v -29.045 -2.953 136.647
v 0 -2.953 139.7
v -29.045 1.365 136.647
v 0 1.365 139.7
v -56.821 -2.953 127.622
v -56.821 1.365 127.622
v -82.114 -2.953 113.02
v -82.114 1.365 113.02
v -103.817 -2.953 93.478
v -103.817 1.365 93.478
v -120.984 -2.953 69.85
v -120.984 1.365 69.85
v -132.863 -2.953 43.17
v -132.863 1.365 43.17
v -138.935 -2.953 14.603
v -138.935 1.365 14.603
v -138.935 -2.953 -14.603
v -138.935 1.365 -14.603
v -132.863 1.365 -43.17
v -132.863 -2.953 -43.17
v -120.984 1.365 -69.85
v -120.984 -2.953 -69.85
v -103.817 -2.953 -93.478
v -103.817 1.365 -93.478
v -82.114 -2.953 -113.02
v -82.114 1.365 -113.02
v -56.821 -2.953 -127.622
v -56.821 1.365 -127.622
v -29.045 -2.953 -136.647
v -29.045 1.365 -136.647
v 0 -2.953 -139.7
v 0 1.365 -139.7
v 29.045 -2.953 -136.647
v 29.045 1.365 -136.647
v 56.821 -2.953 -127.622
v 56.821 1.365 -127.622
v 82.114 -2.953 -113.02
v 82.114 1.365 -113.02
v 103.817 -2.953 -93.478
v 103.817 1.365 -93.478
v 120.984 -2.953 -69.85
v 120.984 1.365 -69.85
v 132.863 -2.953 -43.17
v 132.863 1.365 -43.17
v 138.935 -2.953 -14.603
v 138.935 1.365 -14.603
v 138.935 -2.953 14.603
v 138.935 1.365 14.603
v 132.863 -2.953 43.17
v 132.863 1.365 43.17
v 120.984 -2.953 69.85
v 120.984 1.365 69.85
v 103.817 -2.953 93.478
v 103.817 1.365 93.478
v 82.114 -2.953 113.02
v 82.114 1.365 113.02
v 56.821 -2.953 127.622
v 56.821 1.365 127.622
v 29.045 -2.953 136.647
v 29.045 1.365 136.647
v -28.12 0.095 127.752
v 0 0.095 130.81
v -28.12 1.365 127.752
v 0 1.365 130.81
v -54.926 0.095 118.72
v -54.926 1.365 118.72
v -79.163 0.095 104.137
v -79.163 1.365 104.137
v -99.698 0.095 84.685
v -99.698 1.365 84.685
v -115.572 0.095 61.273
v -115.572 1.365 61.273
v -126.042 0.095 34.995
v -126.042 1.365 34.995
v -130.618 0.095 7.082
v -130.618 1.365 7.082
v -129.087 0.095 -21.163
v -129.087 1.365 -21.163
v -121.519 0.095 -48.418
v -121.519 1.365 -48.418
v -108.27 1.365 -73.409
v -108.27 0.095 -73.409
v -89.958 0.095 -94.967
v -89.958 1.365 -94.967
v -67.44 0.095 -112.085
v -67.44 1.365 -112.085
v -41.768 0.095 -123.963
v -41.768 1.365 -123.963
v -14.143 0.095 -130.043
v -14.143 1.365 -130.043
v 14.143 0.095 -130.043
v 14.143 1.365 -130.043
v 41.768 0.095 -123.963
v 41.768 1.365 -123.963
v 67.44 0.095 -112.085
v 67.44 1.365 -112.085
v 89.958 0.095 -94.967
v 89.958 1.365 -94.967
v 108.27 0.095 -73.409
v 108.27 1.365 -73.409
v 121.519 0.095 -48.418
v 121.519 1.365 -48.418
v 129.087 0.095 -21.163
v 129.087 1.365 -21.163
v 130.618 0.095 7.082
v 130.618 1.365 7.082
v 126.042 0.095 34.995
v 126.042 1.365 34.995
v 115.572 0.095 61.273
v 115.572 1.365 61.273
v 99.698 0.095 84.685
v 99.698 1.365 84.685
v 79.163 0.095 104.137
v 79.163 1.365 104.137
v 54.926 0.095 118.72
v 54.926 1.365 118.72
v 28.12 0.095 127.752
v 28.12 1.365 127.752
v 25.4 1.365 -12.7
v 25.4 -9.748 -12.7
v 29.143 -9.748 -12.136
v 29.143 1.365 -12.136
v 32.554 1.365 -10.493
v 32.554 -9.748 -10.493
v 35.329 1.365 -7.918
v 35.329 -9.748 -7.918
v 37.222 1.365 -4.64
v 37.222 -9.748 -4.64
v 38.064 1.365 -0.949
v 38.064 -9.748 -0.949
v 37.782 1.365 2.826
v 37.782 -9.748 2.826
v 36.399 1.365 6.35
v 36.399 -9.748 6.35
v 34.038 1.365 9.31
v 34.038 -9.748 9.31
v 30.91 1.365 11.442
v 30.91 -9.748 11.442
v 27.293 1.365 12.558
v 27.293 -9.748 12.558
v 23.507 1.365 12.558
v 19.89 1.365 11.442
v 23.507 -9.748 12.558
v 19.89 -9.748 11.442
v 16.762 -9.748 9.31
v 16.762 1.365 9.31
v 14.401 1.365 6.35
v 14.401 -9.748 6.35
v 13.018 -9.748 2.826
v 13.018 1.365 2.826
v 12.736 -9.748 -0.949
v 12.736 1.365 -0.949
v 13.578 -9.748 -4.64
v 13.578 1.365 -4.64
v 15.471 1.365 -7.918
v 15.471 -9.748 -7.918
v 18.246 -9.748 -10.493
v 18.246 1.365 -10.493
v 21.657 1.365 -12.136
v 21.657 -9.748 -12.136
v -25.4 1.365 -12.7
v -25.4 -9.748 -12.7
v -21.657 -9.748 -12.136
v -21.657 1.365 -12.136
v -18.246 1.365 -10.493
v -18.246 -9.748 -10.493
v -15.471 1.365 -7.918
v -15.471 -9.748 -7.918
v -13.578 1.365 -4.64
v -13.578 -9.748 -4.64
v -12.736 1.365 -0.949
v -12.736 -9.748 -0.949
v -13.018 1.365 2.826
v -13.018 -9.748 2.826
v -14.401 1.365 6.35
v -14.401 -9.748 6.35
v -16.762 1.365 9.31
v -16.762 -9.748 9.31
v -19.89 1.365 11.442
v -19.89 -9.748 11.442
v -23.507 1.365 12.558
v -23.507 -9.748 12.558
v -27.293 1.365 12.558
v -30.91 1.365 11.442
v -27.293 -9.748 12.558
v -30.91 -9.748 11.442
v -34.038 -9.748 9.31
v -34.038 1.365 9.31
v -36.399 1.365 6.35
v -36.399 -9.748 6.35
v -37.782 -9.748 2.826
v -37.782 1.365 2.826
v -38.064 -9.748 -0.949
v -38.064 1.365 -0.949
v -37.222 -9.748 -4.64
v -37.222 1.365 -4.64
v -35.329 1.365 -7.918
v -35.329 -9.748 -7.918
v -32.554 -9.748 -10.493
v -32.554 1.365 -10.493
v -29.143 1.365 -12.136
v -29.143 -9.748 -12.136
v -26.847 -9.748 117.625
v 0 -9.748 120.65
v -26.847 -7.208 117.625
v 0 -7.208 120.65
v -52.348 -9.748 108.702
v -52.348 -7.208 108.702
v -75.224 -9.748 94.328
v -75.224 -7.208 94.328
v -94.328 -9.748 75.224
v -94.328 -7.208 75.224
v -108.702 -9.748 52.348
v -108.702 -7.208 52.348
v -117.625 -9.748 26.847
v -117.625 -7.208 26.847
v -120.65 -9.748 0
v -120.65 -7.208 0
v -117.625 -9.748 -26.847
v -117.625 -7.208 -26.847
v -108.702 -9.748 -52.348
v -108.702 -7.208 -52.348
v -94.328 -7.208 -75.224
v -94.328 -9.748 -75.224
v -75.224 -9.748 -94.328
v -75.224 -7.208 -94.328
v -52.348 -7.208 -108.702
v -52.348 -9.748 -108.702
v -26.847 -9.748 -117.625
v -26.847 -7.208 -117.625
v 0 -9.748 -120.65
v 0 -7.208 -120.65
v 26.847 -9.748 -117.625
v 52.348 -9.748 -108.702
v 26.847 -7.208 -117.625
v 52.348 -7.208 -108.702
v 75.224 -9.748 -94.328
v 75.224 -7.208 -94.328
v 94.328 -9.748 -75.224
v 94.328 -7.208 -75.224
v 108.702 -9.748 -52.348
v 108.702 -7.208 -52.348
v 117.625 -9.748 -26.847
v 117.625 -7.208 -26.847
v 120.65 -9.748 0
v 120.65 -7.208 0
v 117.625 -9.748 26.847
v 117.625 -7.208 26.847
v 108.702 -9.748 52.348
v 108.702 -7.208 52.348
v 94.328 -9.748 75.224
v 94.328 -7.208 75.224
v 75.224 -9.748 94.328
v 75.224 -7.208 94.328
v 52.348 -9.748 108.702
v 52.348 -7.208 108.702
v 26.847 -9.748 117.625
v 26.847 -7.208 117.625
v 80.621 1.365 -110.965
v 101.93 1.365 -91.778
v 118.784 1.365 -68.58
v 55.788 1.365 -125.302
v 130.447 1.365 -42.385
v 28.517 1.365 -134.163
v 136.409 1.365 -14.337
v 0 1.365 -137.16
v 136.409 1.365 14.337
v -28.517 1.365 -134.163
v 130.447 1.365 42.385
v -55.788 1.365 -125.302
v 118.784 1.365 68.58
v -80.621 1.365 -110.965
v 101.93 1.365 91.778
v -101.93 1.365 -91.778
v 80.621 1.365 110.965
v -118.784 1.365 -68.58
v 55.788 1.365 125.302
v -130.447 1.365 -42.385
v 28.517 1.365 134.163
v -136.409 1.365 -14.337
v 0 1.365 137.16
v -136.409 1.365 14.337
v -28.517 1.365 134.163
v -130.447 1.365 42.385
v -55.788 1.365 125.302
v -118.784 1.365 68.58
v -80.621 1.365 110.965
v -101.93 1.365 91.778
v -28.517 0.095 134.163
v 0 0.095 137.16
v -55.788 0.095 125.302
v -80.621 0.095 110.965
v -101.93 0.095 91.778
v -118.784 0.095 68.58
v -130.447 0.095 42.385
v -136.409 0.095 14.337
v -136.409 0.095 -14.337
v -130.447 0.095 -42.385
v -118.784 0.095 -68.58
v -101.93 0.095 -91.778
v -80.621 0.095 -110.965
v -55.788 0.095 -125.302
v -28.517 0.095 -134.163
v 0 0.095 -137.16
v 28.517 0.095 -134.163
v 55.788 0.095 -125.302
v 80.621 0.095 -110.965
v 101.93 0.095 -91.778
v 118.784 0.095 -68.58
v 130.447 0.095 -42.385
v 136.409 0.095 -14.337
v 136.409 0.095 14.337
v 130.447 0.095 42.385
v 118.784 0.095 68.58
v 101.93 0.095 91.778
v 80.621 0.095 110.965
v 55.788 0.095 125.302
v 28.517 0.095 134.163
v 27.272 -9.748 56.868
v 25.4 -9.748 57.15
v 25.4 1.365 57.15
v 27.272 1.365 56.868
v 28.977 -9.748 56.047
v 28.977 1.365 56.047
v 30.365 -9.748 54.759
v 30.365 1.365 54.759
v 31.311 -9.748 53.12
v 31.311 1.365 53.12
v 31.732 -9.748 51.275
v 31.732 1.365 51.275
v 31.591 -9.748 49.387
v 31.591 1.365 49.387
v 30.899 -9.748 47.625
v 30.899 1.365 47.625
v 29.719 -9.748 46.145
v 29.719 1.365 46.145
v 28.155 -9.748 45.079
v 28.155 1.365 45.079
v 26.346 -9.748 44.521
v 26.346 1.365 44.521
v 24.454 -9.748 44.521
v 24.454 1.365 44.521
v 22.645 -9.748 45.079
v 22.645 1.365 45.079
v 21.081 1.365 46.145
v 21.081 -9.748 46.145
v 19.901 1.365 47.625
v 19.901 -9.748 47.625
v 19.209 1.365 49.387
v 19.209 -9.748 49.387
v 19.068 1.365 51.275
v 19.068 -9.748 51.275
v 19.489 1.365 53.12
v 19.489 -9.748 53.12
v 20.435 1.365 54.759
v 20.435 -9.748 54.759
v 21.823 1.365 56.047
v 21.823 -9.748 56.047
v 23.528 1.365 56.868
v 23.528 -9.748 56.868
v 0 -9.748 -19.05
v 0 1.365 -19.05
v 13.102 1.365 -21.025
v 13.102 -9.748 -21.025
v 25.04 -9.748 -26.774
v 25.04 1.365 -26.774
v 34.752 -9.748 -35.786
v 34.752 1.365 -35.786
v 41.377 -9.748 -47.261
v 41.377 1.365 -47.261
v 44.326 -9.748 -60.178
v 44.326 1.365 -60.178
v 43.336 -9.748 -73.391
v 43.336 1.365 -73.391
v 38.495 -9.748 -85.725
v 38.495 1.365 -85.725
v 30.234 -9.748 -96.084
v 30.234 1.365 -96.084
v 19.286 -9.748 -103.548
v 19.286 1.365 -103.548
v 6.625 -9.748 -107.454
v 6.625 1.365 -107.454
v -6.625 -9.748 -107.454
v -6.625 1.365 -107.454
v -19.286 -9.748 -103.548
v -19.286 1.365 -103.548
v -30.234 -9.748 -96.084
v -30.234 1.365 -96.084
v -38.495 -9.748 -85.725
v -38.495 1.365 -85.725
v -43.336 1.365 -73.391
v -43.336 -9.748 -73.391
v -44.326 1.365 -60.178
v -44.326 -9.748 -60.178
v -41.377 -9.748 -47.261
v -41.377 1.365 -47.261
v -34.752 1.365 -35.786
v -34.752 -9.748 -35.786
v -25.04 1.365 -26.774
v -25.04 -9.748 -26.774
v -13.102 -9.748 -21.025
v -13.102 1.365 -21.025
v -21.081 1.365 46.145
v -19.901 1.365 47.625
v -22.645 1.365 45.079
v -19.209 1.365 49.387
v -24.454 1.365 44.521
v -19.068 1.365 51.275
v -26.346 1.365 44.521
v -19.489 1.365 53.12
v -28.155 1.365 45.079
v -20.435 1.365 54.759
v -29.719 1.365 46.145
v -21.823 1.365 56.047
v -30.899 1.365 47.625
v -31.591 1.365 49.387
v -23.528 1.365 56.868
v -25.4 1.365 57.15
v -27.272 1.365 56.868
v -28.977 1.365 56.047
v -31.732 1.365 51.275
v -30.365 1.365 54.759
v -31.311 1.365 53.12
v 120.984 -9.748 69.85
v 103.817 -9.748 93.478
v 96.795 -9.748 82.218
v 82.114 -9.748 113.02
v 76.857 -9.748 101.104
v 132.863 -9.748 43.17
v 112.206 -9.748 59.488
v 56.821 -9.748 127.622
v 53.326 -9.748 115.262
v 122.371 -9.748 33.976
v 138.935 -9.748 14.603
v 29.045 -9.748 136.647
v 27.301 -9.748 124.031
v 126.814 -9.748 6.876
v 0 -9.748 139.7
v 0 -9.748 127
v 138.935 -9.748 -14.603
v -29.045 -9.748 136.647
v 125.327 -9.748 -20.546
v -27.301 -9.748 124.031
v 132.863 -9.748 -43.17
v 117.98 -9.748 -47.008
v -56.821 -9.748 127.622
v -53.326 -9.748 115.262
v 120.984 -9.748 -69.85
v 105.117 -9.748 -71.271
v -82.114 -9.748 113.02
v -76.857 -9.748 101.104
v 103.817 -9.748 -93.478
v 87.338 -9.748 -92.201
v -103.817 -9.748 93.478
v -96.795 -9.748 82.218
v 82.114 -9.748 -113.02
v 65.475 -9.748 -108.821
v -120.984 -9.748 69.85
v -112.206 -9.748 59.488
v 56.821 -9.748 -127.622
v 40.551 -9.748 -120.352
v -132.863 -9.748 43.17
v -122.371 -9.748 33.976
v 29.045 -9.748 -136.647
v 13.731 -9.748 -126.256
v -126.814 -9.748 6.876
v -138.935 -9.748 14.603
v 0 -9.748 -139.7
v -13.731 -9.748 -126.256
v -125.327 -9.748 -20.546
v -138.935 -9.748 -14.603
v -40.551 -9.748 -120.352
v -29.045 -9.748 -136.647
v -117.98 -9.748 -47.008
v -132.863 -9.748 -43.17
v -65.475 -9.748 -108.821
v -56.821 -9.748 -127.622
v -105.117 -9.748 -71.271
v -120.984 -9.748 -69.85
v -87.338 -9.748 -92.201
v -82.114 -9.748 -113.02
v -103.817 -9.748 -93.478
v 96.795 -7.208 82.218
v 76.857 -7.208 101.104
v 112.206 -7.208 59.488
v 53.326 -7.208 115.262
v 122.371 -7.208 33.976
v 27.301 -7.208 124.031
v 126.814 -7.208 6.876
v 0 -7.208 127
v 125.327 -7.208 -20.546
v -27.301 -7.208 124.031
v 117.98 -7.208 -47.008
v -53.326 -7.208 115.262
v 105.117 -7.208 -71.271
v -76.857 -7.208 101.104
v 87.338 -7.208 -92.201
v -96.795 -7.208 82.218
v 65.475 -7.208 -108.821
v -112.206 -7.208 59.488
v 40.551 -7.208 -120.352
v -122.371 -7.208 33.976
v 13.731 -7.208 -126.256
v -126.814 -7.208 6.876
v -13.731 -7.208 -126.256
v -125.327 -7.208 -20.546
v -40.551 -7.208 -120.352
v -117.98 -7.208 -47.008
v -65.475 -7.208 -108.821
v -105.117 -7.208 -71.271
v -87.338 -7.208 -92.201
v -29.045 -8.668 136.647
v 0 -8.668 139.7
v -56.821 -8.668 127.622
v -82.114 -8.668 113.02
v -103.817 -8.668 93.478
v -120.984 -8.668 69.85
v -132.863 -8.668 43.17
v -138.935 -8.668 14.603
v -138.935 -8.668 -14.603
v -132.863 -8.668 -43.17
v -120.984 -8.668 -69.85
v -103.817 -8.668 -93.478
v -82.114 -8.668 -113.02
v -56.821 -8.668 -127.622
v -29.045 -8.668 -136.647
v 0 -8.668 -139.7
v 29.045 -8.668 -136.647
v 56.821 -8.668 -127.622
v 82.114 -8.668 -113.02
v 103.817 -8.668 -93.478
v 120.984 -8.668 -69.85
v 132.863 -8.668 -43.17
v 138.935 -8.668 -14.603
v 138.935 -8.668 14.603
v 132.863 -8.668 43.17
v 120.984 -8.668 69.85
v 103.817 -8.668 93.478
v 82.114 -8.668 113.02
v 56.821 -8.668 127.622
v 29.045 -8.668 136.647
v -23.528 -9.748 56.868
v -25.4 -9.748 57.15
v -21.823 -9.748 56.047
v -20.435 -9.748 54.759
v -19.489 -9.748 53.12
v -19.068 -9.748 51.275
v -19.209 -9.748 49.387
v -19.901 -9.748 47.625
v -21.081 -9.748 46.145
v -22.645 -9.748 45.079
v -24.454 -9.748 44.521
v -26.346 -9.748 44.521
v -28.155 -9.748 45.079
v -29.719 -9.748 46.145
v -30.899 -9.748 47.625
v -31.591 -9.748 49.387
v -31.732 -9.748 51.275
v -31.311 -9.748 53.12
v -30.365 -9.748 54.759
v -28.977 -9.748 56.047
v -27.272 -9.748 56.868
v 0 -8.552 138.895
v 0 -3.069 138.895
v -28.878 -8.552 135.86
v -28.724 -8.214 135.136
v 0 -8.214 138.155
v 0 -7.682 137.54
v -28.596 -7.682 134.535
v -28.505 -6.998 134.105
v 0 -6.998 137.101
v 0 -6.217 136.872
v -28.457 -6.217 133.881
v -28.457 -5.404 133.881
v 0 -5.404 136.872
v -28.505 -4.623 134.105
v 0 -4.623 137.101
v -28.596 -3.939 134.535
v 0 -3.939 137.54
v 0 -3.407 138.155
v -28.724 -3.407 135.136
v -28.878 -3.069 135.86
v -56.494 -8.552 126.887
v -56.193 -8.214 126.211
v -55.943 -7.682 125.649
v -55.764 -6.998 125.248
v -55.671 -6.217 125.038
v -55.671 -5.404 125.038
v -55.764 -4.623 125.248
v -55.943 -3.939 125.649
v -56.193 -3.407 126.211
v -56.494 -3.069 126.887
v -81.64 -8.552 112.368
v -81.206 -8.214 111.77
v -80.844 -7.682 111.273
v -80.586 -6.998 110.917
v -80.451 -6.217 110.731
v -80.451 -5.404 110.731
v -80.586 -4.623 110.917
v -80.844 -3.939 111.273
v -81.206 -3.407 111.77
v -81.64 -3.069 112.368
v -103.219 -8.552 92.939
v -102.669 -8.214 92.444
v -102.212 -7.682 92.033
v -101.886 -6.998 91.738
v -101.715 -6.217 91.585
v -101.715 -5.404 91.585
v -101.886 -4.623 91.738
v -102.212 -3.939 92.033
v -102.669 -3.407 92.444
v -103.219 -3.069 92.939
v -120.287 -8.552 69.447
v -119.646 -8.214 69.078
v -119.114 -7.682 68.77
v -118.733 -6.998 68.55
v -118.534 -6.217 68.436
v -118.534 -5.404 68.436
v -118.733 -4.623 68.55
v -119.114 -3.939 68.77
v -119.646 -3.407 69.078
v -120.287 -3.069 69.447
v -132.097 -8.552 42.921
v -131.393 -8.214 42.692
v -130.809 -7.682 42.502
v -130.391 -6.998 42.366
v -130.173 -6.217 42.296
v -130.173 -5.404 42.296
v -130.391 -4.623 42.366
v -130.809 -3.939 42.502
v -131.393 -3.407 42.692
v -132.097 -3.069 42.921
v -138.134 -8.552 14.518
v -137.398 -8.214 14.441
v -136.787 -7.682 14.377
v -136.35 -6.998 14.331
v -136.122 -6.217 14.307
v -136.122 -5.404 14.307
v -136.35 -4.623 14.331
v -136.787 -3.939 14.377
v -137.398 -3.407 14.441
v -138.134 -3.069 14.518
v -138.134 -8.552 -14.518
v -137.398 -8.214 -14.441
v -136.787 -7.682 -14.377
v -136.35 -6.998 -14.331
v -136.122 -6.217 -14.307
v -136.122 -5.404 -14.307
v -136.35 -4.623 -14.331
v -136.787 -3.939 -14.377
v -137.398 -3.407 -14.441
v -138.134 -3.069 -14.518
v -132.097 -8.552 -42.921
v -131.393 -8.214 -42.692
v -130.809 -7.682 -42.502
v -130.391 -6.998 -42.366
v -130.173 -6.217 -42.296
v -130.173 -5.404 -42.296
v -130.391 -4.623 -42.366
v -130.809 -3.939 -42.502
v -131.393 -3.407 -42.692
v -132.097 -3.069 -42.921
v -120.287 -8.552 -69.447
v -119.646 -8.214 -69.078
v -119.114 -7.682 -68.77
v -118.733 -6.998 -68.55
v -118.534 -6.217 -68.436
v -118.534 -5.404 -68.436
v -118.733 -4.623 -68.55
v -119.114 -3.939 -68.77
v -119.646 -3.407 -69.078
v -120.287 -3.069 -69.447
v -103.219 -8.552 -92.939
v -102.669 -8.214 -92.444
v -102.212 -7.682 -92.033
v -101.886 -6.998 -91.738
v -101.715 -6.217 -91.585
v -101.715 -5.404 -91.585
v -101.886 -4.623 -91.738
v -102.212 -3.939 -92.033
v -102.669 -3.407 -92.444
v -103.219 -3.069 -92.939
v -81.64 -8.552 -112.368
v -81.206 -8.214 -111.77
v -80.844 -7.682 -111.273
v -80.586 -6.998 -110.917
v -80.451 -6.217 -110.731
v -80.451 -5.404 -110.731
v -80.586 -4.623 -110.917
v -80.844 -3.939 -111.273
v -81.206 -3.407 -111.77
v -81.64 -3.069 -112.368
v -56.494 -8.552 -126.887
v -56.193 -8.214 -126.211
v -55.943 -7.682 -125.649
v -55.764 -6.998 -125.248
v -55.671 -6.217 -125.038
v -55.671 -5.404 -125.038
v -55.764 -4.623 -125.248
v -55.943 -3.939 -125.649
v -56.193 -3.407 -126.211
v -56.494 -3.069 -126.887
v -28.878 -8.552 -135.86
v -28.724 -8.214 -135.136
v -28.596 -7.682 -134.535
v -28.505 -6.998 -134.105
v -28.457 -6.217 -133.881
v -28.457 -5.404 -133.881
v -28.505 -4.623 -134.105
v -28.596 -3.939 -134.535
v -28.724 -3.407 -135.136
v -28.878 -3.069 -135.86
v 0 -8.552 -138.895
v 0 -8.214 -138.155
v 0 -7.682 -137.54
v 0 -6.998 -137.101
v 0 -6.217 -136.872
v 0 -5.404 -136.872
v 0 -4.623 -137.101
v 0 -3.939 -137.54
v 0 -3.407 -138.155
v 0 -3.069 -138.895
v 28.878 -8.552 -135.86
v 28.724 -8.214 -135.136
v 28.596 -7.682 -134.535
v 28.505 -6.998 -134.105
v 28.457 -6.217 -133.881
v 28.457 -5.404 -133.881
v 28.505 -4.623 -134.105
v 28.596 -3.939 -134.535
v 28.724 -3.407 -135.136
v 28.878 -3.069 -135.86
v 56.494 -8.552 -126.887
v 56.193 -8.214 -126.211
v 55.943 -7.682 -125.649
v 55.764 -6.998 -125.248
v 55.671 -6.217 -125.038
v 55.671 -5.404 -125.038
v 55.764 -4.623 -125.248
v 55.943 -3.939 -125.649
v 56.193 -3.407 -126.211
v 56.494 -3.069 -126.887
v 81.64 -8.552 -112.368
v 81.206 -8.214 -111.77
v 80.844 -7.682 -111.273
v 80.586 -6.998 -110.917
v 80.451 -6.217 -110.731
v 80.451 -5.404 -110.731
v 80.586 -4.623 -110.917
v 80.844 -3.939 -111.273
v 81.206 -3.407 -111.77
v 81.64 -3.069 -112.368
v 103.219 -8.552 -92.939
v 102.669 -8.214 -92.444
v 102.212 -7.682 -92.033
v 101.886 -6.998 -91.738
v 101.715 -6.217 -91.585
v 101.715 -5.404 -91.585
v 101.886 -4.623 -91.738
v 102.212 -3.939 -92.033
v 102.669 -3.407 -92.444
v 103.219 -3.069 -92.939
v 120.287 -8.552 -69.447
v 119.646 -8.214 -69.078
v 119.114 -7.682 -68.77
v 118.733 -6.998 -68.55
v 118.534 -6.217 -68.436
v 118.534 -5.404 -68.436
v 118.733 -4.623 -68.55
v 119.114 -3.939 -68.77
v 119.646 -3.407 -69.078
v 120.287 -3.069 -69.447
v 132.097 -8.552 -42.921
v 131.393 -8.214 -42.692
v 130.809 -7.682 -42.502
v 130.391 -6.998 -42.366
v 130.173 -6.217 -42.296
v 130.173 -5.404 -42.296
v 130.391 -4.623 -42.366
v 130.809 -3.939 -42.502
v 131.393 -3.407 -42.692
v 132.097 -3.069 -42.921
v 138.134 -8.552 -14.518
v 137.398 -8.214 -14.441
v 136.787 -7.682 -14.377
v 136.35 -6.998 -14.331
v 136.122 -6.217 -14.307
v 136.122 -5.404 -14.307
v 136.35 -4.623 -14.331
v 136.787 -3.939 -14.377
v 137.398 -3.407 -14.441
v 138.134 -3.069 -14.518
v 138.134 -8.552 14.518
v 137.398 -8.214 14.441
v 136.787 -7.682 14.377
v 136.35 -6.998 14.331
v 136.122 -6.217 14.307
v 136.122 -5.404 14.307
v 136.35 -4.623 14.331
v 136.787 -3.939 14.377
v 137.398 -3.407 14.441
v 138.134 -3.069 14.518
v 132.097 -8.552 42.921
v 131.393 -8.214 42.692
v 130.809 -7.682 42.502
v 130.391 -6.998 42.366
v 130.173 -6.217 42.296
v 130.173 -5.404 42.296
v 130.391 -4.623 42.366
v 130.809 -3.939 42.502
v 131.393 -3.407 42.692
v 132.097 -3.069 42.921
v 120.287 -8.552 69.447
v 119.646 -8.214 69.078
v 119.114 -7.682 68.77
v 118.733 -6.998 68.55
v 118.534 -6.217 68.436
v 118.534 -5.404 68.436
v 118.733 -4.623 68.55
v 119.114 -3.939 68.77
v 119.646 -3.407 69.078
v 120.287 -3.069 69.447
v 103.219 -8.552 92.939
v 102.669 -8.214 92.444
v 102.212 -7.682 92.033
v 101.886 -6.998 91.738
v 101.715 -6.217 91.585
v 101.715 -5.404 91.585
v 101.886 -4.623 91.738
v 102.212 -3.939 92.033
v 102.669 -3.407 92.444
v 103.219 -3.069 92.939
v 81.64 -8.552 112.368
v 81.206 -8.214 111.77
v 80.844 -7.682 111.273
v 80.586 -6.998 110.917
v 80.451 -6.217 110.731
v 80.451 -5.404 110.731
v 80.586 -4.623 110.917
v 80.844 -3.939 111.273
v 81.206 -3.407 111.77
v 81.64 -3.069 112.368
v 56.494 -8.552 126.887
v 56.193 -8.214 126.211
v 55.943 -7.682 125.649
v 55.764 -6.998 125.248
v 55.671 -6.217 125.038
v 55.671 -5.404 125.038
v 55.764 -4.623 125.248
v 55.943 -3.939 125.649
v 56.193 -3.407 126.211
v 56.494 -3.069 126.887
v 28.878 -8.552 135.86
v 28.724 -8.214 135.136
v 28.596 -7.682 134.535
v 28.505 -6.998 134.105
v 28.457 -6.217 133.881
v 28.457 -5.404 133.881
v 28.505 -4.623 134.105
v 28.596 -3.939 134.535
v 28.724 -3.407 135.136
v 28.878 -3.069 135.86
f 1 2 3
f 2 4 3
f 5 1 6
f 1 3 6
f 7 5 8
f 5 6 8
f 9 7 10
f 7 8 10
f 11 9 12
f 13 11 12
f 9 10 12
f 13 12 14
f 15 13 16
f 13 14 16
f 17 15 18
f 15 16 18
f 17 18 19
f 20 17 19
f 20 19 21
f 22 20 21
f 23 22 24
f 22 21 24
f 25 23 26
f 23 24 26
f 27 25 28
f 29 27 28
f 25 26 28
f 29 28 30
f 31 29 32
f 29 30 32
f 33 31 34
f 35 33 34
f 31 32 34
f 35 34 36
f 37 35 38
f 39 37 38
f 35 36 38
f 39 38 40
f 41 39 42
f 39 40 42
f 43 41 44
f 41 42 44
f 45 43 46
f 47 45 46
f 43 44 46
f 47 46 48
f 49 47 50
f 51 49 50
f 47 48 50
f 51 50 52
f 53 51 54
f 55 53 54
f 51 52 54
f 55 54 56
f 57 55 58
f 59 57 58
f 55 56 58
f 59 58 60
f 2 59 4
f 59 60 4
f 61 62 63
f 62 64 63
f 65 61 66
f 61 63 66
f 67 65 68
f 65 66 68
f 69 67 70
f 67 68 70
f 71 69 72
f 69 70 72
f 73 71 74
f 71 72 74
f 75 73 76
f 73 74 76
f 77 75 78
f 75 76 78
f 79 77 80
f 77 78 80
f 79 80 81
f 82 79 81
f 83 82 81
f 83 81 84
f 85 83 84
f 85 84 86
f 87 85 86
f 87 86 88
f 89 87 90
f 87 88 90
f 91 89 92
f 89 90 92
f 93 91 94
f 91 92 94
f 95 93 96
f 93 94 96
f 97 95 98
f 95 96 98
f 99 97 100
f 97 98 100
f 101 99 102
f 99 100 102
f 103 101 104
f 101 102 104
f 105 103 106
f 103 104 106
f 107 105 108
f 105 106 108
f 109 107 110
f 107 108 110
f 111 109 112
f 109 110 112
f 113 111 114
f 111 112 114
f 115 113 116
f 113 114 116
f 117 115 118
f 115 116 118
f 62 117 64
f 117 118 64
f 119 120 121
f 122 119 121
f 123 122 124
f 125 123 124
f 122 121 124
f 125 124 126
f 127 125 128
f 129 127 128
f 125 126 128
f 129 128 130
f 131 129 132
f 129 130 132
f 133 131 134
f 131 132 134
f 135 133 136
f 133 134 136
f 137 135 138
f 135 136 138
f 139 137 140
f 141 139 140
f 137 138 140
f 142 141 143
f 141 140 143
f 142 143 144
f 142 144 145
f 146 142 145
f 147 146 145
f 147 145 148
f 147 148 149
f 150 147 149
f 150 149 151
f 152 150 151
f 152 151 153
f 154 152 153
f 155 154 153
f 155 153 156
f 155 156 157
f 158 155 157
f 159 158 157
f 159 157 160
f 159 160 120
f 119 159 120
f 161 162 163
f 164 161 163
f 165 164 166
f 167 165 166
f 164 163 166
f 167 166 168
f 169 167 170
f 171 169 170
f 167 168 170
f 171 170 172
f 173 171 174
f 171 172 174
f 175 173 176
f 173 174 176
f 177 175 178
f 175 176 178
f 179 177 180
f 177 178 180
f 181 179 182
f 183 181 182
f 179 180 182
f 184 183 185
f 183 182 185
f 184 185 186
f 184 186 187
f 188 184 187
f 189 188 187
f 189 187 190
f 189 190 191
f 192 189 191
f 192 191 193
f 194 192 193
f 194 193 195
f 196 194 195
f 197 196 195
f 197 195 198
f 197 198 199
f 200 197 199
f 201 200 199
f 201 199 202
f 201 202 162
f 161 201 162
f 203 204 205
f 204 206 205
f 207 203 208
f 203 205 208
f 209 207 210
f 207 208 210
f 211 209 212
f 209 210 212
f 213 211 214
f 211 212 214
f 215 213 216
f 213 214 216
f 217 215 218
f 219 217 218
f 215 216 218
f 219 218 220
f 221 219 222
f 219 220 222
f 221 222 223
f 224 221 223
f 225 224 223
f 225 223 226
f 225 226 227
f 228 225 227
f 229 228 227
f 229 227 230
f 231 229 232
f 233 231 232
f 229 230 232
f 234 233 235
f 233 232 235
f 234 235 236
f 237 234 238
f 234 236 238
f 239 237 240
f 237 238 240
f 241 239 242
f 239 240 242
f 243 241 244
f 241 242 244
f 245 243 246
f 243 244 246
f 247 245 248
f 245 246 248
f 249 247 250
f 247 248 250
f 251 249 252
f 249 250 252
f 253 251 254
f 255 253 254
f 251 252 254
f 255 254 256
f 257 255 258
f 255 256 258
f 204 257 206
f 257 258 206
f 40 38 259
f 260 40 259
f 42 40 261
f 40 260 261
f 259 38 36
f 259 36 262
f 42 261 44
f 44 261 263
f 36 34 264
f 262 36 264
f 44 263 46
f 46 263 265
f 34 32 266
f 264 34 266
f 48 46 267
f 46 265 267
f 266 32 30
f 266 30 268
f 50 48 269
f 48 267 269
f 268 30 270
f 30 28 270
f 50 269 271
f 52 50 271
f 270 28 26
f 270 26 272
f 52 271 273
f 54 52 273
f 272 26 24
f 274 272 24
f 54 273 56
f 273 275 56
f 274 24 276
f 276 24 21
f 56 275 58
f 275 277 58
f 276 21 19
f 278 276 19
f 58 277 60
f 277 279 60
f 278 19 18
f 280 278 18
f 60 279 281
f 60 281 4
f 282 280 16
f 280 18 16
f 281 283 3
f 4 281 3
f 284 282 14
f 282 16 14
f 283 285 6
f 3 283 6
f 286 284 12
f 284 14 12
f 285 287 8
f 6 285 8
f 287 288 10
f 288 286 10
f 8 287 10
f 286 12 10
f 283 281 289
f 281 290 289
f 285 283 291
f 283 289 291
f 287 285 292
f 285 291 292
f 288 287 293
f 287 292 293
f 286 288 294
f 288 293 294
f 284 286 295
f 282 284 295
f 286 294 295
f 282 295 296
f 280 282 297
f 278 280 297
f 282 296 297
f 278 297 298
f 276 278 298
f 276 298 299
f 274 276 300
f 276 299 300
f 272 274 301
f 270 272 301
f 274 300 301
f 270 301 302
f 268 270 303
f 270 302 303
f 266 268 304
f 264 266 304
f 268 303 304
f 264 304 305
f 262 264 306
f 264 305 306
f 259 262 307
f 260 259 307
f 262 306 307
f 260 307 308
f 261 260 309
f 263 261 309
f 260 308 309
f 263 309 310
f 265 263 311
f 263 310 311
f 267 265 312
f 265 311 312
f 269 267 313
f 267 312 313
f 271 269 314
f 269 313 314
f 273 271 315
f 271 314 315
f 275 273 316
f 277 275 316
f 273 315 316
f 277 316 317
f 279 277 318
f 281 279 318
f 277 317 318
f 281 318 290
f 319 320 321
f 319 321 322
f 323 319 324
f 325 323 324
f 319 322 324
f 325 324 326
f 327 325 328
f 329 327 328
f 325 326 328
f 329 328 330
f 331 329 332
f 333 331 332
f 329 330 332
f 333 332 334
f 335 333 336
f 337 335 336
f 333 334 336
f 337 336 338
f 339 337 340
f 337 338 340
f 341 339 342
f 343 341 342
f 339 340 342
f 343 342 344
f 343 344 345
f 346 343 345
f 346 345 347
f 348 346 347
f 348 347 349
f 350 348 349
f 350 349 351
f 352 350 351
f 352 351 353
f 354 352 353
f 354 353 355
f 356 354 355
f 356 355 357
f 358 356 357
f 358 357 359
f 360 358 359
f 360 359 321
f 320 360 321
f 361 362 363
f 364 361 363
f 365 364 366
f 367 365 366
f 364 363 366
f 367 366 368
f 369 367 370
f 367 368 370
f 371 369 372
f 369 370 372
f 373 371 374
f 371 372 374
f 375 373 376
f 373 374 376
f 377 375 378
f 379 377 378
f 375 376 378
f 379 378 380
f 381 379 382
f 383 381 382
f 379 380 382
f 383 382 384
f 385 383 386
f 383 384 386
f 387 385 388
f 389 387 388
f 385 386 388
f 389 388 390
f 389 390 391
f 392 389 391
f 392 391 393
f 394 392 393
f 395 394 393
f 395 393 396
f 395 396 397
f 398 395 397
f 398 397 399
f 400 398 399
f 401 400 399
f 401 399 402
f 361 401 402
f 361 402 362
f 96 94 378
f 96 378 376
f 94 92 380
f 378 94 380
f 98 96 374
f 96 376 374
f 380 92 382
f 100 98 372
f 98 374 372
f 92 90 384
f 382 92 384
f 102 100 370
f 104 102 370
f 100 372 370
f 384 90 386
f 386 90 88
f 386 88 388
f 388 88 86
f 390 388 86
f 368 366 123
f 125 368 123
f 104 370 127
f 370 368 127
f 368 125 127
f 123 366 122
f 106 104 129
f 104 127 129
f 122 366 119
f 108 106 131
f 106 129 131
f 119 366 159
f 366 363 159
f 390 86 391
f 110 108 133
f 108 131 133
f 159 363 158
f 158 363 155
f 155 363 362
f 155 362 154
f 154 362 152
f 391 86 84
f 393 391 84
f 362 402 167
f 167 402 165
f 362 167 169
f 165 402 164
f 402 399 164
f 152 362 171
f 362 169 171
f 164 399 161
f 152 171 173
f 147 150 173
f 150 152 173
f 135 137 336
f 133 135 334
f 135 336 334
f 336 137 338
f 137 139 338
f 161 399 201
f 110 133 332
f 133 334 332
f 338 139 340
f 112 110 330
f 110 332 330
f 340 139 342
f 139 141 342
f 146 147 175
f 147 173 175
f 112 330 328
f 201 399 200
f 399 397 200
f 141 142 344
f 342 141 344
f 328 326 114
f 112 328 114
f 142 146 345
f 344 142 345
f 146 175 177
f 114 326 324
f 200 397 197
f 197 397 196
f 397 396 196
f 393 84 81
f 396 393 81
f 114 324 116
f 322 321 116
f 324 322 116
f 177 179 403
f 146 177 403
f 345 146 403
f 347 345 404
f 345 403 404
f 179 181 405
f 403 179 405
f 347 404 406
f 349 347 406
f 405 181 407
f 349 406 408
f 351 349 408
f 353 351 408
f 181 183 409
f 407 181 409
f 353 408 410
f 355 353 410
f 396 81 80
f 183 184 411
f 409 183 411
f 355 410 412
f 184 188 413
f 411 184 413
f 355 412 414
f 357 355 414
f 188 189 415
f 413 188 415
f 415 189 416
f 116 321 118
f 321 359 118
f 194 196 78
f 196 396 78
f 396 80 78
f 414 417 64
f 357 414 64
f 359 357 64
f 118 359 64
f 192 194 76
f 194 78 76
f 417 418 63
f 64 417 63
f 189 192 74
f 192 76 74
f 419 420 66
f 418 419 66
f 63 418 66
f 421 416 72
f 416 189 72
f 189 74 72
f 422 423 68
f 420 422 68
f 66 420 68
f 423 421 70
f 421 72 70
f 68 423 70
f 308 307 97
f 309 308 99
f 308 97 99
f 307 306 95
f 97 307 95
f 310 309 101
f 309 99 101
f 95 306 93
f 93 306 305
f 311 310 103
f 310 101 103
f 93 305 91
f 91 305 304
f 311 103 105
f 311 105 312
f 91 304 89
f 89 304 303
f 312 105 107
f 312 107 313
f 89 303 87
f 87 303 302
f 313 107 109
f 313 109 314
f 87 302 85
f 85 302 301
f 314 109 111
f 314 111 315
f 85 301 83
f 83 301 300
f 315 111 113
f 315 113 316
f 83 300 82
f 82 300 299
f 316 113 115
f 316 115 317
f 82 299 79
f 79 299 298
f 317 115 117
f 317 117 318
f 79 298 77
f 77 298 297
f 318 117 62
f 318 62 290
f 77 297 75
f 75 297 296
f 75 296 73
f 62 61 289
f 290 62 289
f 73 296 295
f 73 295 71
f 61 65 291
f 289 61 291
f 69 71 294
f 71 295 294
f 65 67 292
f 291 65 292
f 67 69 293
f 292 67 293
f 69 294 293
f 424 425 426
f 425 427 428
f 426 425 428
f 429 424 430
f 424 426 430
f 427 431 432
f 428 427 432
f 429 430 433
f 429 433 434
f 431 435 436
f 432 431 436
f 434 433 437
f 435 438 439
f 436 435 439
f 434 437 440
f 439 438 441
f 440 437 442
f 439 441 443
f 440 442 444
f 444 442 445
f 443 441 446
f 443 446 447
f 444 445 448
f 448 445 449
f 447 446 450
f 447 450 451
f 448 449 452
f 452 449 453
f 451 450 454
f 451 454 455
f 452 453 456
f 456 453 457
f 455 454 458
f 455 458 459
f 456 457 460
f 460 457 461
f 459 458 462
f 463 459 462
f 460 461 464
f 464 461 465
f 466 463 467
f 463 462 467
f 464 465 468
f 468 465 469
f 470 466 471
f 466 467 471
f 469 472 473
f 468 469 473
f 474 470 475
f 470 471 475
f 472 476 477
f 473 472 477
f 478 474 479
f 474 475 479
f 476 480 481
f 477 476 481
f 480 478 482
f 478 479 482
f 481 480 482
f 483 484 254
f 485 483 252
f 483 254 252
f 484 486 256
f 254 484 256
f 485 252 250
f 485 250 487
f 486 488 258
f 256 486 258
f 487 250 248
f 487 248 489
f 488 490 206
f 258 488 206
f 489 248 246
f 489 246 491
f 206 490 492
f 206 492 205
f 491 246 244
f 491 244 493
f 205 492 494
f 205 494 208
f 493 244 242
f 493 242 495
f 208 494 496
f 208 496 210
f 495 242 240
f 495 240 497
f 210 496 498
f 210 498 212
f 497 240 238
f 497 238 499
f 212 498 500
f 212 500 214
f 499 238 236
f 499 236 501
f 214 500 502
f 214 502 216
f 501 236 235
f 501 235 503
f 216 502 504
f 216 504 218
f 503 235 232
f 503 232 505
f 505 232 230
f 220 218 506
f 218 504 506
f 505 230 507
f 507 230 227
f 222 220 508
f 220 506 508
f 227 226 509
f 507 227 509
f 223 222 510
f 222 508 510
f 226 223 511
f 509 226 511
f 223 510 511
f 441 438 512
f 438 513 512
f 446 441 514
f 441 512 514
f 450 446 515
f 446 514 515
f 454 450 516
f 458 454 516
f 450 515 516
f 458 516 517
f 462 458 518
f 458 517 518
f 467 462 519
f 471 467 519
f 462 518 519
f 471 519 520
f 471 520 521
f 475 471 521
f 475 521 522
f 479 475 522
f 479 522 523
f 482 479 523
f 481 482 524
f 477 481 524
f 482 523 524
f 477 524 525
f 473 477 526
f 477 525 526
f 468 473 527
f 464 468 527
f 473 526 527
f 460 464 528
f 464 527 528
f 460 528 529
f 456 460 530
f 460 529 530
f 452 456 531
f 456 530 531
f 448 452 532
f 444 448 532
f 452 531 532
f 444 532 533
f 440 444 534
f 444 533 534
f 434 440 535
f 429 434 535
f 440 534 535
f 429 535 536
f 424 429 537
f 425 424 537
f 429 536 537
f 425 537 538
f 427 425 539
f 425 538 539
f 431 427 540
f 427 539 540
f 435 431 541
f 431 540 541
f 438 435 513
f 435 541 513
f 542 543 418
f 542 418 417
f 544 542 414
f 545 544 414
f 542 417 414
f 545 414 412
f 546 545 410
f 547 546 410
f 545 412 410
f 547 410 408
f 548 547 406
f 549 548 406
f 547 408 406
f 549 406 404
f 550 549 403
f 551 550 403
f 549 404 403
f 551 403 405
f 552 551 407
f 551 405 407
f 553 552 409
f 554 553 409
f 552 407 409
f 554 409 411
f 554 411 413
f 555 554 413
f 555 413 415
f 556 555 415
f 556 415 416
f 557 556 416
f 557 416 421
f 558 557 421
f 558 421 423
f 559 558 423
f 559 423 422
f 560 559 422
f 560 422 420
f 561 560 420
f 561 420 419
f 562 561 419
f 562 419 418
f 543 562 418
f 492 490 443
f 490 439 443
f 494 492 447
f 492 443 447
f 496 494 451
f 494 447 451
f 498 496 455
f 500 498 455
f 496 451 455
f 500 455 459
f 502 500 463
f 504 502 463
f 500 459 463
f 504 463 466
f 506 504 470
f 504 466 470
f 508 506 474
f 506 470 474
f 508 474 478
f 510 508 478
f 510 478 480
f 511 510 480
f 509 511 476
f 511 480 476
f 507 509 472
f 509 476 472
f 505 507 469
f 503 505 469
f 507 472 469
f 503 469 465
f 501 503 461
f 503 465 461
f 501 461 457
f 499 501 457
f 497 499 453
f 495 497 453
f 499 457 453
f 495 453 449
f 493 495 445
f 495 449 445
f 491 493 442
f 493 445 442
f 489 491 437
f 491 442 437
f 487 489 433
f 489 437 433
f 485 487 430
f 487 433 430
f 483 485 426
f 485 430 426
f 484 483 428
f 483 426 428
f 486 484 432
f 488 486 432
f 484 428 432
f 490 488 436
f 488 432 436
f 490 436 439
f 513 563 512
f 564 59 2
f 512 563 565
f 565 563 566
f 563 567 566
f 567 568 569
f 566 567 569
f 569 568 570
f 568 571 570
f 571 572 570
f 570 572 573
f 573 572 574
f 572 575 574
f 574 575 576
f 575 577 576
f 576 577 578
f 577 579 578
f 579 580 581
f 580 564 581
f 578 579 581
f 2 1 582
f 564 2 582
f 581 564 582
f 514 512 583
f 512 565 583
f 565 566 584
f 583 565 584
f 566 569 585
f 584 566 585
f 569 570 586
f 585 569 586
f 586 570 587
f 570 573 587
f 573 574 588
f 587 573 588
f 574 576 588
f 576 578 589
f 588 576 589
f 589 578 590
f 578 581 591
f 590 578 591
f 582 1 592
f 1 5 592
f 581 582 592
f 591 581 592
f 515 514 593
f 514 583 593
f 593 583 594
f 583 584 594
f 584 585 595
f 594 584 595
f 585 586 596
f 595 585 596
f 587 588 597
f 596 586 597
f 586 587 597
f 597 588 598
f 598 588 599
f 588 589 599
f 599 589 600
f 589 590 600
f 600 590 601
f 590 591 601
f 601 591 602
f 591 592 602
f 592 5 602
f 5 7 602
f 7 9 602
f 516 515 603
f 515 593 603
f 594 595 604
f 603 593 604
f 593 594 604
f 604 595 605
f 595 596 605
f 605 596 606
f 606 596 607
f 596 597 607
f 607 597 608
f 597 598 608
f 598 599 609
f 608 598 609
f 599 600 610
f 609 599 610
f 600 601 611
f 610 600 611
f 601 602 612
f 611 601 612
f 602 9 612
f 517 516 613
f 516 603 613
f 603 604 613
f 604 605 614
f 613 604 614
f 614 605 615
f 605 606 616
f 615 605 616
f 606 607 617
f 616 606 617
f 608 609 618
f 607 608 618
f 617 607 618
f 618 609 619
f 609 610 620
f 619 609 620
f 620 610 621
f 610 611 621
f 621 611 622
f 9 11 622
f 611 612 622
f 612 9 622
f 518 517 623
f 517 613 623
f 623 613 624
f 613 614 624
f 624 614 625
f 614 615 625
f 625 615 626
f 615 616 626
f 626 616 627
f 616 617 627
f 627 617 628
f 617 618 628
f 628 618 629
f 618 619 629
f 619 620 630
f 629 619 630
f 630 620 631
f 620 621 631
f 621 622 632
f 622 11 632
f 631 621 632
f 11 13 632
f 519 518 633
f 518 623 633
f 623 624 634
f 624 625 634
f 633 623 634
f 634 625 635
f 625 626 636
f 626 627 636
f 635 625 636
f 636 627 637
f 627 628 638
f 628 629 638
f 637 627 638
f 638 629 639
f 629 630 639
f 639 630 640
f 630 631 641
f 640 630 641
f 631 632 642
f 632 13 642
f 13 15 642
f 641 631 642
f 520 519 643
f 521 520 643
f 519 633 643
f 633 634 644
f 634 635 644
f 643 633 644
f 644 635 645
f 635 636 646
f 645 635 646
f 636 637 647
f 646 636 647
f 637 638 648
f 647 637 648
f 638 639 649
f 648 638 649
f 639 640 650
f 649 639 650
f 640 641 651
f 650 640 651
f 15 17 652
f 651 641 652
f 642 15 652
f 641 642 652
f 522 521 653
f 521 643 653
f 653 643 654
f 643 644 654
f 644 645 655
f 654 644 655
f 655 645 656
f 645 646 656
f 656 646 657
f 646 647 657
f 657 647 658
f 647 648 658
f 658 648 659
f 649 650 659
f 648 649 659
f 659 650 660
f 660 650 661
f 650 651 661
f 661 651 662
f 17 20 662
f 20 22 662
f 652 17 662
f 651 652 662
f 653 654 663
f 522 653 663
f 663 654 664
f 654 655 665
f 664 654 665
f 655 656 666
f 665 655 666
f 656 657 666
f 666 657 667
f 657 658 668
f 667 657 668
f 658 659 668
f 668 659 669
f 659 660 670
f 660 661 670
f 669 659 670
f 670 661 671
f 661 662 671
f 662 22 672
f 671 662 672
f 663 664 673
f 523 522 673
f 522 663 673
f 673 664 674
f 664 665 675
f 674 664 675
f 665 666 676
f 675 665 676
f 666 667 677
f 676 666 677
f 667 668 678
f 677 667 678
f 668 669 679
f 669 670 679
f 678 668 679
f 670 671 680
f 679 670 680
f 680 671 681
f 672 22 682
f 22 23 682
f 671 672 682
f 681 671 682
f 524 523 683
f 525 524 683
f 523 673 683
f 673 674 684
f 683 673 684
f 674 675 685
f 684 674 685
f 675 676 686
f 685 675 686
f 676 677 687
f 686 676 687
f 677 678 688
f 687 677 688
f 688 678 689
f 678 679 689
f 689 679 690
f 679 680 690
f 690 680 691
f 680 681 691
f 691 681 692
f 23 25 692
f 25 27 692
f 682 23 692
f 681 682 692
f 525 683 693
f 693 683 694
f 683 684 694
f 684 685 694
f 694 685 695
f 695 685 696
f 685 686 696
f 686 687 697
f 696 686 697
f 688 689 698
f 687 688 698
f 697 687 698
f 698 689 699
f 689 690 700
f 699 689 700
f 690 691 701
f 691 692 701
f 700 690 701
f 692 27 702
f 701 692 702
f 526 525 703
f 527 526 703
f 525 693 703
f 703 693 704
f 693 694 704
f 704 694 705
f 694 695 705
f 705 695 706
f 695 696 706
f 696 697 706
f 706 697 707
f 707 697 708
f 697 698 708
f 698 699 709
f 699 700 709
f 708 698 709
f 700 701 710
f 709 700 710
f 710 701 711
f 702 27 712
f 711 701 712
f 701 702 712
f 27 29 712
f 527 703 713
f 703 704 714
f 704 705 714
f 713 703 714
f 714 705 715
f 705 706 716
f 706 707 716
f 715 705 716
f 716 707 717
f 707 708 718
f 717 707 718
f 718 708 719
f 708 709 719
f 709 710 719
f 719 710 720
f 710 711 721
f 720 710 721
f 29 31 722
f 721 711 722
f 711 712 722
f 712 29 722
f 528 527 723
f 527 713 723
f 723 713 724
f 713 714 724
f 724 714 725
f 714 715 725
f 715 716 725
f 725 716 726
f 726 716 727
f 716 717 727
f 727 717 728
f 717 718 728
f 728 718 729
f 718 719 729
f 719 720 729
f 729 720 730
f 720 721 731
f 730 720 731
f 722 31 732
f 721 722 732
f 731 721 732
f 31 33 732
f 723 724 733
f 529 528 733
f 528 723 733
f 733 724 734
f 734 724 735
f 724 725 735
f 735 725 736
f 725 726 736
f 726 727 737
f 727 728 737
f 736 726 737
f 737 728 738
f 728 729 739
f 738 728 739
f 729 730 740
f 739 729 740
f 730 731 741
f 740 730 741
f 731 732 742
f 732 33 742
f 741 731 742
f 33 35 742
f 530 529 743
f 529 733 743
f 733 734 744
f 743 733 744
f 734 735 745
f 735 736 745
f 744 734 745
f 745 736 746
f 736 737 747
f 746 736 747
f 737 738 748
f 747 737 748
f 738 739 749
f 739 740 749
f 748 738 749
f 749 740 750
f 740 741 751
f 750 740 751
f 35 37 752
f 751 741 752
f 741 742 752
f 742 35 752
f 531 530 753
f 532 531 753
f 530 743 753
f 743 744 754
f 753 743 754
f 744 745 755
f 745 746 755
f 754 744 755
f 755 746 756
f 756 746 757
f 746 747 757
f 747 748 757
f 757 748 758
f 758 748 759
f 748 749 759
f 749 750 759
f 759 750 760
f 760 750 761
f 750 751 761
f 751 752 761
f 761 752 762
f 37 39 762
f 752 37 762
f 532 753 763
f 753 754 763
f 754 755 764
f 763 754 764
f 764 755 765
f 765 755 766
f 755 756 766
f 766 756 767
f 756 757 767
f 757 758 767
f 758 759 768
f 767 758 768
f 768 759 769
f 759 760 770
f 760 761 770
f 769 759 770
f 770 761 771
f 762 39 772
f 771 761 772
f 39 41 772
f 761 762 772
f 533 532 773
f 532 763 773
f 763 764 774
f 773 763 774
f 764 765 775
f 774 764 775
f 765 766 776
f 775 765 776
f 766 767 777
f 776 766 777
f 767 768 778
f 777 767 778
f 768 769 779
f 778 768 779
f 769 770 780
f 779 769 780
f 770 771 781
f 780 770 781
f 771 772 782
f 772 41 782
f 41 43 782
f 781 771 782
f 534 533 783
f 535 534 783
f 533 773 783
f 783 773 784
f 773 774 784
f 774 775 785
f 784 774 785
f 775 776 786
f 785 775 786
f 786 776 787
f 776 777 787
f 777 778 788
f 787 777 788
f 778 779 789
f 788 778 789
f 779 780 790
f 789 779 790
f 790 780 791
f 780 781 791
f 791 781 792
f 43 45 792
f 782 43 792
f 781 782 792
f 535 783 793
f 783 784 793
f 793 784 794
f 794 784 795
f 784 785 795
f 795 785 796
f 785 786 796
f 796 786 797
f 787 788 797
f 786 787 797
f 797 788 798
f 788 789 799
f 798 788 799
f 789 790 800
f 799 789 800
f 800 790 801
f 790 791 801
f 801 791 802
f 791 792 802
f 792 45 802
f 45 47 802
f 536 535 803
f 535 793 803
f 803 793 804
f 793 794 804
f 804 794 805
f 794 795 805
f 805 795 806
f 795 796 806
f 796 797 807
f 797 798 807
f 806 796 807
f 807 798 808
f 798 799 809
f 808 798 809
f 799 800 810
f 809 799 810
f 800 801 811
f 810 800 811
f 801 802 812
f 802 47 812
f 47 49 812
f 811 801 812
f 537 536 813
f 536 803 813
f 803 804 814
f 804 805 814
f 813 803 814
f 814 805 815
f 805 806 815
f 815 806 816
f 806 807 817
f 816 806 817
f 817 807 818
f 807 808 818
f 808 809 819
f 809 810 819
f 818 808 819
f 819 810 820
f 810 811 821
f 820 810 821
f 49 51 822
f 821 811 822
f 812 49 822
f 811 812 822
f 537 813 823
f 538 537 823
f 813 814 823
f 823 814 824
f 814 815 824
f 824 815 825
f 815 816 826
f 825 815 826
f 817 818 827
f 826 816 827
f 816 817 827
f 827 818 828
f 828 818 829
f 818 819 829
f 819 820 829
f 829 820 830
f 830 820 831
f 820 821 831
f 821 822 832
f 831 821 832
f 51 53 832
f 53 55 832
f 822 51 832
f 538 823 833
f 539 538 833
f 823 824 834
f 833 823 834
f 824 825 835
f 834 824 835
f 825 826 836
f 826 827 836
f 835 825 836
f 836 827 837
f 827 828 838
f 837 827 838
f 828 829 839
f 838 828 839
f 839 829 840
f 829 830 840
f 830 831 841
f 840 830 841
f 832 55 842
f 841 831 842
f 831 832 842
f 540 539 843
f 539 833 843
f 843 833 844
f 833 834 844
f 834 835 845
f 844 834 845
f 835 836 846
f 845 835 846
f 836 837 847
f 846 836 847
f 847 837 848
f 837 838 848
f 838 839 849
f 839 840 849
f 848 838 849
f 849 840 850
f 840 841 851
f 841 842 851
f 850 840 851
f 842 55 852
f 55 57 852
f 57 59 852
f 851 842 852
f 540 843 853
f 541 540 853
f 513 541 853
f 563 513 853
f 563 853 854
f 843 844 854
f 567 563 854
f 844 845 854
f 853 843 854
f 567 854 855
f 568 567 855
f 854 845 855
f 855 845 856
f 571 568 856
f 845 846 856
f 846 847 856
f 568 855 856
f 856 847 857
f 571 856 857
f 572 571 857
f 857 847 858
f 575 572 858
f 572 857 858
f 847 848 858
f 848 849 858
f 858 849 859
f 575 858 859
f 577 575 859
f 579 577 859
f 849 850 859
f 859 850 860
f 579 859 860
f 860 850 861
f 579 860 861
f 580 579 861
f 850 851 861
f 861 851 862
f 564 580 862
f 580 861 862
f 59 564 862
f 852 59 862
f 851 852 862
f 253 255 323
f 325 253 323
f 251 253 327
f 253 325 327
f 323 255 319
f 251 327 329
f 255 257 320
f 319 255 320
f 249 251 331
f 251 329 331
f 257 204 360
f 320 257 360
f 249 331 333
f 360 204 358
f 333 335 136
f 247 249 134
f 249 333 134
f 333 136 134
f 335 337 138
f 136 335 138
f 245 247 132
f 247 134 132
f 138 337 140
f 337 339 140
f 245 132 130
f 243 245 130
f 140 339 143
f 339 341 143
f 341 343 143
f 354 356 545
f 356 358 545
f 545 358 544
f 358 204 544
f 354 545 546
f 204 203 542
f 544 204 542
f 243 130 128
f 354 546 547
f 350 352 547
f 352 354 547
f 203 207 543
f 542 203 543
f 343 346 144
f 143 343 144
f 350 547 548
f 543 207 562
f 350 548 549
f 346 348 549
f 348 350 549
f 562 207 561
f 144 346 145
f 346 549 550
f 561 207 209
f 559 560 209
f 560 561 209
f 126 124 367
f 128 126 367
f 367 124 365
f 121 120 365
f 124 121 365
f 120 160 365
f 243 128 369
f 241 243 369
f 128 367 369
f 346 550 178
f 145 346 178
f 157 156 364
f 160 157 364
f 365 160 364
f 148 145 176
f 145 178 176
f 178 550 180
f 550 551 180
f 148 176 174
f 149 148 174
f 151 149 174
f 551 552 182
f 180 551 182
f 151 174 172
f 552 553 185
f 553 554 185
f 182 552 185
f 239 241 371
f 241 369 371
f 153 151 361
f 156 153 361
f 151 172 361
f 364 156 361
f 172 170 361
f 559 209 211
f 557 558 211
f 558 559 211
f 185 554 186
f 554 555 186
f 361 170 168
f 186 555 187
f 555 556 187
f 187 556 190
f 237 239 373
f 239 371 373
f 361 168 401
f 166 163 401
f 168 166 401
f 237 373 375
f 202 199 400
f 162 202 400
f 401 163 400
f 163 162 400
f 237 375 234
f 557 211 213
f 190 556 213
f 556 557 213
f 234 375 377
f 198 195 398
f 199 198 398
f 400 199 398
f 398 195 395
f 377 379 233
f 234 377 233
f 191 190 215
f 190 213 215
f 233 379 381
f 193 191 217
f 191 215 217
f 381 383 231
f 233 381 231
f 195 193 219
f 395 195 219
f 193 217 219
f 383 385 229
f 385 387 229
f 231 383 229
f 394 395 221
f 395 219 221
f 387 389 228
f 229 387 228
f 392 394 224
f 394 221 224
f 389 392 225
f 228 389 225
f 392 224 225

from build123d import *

# Parameters (mm, degrees)
SKETCH2_R          = 6.35
CUT_EXTRUDE1_DEPTH = 198.877910986
SKETCH3_R          = 12.7
CUT_EXTRUDE2_DEPTH = 198.877910986
SKETCH4_R          = 44.45
CUT_EXTRUDE3_DEPTH = 198.877910986


with BuildPart() as part:
    # Sketch1 → Revolve1 (revolve)
    with BuildSketch(Plane.XY, mode=Mode.PRIVATE) as revolve1_sk:
        with BuildLine():
            Line((0, 1.364957177), (0, -9.747542823))
            Line((0, -9.747542823), (120.65, -9.747542823))
            Line((120.65, -9.747542823), (120.65, -7.207542823))
            Line((120.65, -7.207542823), (127, -7.207542823))
            Line((127, -7.207542823), (127, -9.747542823))
            Line((127, -9.747542823), (139.7, -9.747542823))
            Line((139.7, -9.747542823), (139.7, -8.668042823))
            ThreePointArc((139.7, -8.668042823), (136.8425, -5.810542823), (139.7, -2.953042823))
            Line((139.7, -2.953042823), (139.7, 1.364957177))
            Line((139.7, 1.364957177), (137.16, 1.364957177))
            Line((137.16, 1.364957177), (137.16, 0.094957177))
            Line((137.16, 0.094957177), (130.81, 0.094957177))
            Line((130.81, 0.094957177), (130.81, 1.364957177))
            Line((130.81, 1.364957177), (0, 1.364957177))
        make_face()
    revolve(revolve1_sk.sketch.rotate(Axis((0, 12.263795045, 0), (0, -1, 0)), 90), axis=Axis((0, 12.263795045, 0), (0, -1, 0)))

    # Sketch2 → Cut-Extrude1 (cut, through all)
    with BuildSketch(Plane(origin=(0, 1.364957177, 0), x_dir=(1, 0, 0), z_dir=(0, 1, 0))):
        with Locations(Location((25.4, -50.8, 0), (0, 0, 270))):
            Circle(SKETCH2_R)
        with Locations(Location((-25.4, -50.8, 0), (0, 0, 270))):
            Circle(SKETCH2_R)
    extrude(amount=-CUT_EXTRUDE1_DEPTH, mode=Mode.SUBTRACT)

    # Sketch3 → Cut-Extrude2 (cut, through all)
    with BuildSketch(Plane(origin=(0, -9.747542823, 0), x_dir=(-1, 0, 0), z_dir=(0, -1, 0))):
        with Locations(Location((-25.4, 0, 0), (0, 0, 90))):
            Circle(SKETCH3_R)
        with Locations(Location((25.4, 0, 0), (0, 0, 90))):
            Circle(SKETCH3_R)
    extrude(amount=-CUT_EXTRUDE2_DEPTH, mode=Mode.SUBTRACT)

    # Sketch4 → Cut-Extrude3 (cut, through all)
    with BuildSketch(Plane(origin=(0, 1.364957177, 0), x_dir=(1, 0, 0), z_dir=(0, 1, 0))):
        with Locations(Location((0, 63.5, 0), (0, 0, 270))):
            Circle(SKETCH4_R)
    extrude(amount=-CUT_EXTRUDE3_DEPTH, mode=Mode.SUBTRACT)


solid = part.part
